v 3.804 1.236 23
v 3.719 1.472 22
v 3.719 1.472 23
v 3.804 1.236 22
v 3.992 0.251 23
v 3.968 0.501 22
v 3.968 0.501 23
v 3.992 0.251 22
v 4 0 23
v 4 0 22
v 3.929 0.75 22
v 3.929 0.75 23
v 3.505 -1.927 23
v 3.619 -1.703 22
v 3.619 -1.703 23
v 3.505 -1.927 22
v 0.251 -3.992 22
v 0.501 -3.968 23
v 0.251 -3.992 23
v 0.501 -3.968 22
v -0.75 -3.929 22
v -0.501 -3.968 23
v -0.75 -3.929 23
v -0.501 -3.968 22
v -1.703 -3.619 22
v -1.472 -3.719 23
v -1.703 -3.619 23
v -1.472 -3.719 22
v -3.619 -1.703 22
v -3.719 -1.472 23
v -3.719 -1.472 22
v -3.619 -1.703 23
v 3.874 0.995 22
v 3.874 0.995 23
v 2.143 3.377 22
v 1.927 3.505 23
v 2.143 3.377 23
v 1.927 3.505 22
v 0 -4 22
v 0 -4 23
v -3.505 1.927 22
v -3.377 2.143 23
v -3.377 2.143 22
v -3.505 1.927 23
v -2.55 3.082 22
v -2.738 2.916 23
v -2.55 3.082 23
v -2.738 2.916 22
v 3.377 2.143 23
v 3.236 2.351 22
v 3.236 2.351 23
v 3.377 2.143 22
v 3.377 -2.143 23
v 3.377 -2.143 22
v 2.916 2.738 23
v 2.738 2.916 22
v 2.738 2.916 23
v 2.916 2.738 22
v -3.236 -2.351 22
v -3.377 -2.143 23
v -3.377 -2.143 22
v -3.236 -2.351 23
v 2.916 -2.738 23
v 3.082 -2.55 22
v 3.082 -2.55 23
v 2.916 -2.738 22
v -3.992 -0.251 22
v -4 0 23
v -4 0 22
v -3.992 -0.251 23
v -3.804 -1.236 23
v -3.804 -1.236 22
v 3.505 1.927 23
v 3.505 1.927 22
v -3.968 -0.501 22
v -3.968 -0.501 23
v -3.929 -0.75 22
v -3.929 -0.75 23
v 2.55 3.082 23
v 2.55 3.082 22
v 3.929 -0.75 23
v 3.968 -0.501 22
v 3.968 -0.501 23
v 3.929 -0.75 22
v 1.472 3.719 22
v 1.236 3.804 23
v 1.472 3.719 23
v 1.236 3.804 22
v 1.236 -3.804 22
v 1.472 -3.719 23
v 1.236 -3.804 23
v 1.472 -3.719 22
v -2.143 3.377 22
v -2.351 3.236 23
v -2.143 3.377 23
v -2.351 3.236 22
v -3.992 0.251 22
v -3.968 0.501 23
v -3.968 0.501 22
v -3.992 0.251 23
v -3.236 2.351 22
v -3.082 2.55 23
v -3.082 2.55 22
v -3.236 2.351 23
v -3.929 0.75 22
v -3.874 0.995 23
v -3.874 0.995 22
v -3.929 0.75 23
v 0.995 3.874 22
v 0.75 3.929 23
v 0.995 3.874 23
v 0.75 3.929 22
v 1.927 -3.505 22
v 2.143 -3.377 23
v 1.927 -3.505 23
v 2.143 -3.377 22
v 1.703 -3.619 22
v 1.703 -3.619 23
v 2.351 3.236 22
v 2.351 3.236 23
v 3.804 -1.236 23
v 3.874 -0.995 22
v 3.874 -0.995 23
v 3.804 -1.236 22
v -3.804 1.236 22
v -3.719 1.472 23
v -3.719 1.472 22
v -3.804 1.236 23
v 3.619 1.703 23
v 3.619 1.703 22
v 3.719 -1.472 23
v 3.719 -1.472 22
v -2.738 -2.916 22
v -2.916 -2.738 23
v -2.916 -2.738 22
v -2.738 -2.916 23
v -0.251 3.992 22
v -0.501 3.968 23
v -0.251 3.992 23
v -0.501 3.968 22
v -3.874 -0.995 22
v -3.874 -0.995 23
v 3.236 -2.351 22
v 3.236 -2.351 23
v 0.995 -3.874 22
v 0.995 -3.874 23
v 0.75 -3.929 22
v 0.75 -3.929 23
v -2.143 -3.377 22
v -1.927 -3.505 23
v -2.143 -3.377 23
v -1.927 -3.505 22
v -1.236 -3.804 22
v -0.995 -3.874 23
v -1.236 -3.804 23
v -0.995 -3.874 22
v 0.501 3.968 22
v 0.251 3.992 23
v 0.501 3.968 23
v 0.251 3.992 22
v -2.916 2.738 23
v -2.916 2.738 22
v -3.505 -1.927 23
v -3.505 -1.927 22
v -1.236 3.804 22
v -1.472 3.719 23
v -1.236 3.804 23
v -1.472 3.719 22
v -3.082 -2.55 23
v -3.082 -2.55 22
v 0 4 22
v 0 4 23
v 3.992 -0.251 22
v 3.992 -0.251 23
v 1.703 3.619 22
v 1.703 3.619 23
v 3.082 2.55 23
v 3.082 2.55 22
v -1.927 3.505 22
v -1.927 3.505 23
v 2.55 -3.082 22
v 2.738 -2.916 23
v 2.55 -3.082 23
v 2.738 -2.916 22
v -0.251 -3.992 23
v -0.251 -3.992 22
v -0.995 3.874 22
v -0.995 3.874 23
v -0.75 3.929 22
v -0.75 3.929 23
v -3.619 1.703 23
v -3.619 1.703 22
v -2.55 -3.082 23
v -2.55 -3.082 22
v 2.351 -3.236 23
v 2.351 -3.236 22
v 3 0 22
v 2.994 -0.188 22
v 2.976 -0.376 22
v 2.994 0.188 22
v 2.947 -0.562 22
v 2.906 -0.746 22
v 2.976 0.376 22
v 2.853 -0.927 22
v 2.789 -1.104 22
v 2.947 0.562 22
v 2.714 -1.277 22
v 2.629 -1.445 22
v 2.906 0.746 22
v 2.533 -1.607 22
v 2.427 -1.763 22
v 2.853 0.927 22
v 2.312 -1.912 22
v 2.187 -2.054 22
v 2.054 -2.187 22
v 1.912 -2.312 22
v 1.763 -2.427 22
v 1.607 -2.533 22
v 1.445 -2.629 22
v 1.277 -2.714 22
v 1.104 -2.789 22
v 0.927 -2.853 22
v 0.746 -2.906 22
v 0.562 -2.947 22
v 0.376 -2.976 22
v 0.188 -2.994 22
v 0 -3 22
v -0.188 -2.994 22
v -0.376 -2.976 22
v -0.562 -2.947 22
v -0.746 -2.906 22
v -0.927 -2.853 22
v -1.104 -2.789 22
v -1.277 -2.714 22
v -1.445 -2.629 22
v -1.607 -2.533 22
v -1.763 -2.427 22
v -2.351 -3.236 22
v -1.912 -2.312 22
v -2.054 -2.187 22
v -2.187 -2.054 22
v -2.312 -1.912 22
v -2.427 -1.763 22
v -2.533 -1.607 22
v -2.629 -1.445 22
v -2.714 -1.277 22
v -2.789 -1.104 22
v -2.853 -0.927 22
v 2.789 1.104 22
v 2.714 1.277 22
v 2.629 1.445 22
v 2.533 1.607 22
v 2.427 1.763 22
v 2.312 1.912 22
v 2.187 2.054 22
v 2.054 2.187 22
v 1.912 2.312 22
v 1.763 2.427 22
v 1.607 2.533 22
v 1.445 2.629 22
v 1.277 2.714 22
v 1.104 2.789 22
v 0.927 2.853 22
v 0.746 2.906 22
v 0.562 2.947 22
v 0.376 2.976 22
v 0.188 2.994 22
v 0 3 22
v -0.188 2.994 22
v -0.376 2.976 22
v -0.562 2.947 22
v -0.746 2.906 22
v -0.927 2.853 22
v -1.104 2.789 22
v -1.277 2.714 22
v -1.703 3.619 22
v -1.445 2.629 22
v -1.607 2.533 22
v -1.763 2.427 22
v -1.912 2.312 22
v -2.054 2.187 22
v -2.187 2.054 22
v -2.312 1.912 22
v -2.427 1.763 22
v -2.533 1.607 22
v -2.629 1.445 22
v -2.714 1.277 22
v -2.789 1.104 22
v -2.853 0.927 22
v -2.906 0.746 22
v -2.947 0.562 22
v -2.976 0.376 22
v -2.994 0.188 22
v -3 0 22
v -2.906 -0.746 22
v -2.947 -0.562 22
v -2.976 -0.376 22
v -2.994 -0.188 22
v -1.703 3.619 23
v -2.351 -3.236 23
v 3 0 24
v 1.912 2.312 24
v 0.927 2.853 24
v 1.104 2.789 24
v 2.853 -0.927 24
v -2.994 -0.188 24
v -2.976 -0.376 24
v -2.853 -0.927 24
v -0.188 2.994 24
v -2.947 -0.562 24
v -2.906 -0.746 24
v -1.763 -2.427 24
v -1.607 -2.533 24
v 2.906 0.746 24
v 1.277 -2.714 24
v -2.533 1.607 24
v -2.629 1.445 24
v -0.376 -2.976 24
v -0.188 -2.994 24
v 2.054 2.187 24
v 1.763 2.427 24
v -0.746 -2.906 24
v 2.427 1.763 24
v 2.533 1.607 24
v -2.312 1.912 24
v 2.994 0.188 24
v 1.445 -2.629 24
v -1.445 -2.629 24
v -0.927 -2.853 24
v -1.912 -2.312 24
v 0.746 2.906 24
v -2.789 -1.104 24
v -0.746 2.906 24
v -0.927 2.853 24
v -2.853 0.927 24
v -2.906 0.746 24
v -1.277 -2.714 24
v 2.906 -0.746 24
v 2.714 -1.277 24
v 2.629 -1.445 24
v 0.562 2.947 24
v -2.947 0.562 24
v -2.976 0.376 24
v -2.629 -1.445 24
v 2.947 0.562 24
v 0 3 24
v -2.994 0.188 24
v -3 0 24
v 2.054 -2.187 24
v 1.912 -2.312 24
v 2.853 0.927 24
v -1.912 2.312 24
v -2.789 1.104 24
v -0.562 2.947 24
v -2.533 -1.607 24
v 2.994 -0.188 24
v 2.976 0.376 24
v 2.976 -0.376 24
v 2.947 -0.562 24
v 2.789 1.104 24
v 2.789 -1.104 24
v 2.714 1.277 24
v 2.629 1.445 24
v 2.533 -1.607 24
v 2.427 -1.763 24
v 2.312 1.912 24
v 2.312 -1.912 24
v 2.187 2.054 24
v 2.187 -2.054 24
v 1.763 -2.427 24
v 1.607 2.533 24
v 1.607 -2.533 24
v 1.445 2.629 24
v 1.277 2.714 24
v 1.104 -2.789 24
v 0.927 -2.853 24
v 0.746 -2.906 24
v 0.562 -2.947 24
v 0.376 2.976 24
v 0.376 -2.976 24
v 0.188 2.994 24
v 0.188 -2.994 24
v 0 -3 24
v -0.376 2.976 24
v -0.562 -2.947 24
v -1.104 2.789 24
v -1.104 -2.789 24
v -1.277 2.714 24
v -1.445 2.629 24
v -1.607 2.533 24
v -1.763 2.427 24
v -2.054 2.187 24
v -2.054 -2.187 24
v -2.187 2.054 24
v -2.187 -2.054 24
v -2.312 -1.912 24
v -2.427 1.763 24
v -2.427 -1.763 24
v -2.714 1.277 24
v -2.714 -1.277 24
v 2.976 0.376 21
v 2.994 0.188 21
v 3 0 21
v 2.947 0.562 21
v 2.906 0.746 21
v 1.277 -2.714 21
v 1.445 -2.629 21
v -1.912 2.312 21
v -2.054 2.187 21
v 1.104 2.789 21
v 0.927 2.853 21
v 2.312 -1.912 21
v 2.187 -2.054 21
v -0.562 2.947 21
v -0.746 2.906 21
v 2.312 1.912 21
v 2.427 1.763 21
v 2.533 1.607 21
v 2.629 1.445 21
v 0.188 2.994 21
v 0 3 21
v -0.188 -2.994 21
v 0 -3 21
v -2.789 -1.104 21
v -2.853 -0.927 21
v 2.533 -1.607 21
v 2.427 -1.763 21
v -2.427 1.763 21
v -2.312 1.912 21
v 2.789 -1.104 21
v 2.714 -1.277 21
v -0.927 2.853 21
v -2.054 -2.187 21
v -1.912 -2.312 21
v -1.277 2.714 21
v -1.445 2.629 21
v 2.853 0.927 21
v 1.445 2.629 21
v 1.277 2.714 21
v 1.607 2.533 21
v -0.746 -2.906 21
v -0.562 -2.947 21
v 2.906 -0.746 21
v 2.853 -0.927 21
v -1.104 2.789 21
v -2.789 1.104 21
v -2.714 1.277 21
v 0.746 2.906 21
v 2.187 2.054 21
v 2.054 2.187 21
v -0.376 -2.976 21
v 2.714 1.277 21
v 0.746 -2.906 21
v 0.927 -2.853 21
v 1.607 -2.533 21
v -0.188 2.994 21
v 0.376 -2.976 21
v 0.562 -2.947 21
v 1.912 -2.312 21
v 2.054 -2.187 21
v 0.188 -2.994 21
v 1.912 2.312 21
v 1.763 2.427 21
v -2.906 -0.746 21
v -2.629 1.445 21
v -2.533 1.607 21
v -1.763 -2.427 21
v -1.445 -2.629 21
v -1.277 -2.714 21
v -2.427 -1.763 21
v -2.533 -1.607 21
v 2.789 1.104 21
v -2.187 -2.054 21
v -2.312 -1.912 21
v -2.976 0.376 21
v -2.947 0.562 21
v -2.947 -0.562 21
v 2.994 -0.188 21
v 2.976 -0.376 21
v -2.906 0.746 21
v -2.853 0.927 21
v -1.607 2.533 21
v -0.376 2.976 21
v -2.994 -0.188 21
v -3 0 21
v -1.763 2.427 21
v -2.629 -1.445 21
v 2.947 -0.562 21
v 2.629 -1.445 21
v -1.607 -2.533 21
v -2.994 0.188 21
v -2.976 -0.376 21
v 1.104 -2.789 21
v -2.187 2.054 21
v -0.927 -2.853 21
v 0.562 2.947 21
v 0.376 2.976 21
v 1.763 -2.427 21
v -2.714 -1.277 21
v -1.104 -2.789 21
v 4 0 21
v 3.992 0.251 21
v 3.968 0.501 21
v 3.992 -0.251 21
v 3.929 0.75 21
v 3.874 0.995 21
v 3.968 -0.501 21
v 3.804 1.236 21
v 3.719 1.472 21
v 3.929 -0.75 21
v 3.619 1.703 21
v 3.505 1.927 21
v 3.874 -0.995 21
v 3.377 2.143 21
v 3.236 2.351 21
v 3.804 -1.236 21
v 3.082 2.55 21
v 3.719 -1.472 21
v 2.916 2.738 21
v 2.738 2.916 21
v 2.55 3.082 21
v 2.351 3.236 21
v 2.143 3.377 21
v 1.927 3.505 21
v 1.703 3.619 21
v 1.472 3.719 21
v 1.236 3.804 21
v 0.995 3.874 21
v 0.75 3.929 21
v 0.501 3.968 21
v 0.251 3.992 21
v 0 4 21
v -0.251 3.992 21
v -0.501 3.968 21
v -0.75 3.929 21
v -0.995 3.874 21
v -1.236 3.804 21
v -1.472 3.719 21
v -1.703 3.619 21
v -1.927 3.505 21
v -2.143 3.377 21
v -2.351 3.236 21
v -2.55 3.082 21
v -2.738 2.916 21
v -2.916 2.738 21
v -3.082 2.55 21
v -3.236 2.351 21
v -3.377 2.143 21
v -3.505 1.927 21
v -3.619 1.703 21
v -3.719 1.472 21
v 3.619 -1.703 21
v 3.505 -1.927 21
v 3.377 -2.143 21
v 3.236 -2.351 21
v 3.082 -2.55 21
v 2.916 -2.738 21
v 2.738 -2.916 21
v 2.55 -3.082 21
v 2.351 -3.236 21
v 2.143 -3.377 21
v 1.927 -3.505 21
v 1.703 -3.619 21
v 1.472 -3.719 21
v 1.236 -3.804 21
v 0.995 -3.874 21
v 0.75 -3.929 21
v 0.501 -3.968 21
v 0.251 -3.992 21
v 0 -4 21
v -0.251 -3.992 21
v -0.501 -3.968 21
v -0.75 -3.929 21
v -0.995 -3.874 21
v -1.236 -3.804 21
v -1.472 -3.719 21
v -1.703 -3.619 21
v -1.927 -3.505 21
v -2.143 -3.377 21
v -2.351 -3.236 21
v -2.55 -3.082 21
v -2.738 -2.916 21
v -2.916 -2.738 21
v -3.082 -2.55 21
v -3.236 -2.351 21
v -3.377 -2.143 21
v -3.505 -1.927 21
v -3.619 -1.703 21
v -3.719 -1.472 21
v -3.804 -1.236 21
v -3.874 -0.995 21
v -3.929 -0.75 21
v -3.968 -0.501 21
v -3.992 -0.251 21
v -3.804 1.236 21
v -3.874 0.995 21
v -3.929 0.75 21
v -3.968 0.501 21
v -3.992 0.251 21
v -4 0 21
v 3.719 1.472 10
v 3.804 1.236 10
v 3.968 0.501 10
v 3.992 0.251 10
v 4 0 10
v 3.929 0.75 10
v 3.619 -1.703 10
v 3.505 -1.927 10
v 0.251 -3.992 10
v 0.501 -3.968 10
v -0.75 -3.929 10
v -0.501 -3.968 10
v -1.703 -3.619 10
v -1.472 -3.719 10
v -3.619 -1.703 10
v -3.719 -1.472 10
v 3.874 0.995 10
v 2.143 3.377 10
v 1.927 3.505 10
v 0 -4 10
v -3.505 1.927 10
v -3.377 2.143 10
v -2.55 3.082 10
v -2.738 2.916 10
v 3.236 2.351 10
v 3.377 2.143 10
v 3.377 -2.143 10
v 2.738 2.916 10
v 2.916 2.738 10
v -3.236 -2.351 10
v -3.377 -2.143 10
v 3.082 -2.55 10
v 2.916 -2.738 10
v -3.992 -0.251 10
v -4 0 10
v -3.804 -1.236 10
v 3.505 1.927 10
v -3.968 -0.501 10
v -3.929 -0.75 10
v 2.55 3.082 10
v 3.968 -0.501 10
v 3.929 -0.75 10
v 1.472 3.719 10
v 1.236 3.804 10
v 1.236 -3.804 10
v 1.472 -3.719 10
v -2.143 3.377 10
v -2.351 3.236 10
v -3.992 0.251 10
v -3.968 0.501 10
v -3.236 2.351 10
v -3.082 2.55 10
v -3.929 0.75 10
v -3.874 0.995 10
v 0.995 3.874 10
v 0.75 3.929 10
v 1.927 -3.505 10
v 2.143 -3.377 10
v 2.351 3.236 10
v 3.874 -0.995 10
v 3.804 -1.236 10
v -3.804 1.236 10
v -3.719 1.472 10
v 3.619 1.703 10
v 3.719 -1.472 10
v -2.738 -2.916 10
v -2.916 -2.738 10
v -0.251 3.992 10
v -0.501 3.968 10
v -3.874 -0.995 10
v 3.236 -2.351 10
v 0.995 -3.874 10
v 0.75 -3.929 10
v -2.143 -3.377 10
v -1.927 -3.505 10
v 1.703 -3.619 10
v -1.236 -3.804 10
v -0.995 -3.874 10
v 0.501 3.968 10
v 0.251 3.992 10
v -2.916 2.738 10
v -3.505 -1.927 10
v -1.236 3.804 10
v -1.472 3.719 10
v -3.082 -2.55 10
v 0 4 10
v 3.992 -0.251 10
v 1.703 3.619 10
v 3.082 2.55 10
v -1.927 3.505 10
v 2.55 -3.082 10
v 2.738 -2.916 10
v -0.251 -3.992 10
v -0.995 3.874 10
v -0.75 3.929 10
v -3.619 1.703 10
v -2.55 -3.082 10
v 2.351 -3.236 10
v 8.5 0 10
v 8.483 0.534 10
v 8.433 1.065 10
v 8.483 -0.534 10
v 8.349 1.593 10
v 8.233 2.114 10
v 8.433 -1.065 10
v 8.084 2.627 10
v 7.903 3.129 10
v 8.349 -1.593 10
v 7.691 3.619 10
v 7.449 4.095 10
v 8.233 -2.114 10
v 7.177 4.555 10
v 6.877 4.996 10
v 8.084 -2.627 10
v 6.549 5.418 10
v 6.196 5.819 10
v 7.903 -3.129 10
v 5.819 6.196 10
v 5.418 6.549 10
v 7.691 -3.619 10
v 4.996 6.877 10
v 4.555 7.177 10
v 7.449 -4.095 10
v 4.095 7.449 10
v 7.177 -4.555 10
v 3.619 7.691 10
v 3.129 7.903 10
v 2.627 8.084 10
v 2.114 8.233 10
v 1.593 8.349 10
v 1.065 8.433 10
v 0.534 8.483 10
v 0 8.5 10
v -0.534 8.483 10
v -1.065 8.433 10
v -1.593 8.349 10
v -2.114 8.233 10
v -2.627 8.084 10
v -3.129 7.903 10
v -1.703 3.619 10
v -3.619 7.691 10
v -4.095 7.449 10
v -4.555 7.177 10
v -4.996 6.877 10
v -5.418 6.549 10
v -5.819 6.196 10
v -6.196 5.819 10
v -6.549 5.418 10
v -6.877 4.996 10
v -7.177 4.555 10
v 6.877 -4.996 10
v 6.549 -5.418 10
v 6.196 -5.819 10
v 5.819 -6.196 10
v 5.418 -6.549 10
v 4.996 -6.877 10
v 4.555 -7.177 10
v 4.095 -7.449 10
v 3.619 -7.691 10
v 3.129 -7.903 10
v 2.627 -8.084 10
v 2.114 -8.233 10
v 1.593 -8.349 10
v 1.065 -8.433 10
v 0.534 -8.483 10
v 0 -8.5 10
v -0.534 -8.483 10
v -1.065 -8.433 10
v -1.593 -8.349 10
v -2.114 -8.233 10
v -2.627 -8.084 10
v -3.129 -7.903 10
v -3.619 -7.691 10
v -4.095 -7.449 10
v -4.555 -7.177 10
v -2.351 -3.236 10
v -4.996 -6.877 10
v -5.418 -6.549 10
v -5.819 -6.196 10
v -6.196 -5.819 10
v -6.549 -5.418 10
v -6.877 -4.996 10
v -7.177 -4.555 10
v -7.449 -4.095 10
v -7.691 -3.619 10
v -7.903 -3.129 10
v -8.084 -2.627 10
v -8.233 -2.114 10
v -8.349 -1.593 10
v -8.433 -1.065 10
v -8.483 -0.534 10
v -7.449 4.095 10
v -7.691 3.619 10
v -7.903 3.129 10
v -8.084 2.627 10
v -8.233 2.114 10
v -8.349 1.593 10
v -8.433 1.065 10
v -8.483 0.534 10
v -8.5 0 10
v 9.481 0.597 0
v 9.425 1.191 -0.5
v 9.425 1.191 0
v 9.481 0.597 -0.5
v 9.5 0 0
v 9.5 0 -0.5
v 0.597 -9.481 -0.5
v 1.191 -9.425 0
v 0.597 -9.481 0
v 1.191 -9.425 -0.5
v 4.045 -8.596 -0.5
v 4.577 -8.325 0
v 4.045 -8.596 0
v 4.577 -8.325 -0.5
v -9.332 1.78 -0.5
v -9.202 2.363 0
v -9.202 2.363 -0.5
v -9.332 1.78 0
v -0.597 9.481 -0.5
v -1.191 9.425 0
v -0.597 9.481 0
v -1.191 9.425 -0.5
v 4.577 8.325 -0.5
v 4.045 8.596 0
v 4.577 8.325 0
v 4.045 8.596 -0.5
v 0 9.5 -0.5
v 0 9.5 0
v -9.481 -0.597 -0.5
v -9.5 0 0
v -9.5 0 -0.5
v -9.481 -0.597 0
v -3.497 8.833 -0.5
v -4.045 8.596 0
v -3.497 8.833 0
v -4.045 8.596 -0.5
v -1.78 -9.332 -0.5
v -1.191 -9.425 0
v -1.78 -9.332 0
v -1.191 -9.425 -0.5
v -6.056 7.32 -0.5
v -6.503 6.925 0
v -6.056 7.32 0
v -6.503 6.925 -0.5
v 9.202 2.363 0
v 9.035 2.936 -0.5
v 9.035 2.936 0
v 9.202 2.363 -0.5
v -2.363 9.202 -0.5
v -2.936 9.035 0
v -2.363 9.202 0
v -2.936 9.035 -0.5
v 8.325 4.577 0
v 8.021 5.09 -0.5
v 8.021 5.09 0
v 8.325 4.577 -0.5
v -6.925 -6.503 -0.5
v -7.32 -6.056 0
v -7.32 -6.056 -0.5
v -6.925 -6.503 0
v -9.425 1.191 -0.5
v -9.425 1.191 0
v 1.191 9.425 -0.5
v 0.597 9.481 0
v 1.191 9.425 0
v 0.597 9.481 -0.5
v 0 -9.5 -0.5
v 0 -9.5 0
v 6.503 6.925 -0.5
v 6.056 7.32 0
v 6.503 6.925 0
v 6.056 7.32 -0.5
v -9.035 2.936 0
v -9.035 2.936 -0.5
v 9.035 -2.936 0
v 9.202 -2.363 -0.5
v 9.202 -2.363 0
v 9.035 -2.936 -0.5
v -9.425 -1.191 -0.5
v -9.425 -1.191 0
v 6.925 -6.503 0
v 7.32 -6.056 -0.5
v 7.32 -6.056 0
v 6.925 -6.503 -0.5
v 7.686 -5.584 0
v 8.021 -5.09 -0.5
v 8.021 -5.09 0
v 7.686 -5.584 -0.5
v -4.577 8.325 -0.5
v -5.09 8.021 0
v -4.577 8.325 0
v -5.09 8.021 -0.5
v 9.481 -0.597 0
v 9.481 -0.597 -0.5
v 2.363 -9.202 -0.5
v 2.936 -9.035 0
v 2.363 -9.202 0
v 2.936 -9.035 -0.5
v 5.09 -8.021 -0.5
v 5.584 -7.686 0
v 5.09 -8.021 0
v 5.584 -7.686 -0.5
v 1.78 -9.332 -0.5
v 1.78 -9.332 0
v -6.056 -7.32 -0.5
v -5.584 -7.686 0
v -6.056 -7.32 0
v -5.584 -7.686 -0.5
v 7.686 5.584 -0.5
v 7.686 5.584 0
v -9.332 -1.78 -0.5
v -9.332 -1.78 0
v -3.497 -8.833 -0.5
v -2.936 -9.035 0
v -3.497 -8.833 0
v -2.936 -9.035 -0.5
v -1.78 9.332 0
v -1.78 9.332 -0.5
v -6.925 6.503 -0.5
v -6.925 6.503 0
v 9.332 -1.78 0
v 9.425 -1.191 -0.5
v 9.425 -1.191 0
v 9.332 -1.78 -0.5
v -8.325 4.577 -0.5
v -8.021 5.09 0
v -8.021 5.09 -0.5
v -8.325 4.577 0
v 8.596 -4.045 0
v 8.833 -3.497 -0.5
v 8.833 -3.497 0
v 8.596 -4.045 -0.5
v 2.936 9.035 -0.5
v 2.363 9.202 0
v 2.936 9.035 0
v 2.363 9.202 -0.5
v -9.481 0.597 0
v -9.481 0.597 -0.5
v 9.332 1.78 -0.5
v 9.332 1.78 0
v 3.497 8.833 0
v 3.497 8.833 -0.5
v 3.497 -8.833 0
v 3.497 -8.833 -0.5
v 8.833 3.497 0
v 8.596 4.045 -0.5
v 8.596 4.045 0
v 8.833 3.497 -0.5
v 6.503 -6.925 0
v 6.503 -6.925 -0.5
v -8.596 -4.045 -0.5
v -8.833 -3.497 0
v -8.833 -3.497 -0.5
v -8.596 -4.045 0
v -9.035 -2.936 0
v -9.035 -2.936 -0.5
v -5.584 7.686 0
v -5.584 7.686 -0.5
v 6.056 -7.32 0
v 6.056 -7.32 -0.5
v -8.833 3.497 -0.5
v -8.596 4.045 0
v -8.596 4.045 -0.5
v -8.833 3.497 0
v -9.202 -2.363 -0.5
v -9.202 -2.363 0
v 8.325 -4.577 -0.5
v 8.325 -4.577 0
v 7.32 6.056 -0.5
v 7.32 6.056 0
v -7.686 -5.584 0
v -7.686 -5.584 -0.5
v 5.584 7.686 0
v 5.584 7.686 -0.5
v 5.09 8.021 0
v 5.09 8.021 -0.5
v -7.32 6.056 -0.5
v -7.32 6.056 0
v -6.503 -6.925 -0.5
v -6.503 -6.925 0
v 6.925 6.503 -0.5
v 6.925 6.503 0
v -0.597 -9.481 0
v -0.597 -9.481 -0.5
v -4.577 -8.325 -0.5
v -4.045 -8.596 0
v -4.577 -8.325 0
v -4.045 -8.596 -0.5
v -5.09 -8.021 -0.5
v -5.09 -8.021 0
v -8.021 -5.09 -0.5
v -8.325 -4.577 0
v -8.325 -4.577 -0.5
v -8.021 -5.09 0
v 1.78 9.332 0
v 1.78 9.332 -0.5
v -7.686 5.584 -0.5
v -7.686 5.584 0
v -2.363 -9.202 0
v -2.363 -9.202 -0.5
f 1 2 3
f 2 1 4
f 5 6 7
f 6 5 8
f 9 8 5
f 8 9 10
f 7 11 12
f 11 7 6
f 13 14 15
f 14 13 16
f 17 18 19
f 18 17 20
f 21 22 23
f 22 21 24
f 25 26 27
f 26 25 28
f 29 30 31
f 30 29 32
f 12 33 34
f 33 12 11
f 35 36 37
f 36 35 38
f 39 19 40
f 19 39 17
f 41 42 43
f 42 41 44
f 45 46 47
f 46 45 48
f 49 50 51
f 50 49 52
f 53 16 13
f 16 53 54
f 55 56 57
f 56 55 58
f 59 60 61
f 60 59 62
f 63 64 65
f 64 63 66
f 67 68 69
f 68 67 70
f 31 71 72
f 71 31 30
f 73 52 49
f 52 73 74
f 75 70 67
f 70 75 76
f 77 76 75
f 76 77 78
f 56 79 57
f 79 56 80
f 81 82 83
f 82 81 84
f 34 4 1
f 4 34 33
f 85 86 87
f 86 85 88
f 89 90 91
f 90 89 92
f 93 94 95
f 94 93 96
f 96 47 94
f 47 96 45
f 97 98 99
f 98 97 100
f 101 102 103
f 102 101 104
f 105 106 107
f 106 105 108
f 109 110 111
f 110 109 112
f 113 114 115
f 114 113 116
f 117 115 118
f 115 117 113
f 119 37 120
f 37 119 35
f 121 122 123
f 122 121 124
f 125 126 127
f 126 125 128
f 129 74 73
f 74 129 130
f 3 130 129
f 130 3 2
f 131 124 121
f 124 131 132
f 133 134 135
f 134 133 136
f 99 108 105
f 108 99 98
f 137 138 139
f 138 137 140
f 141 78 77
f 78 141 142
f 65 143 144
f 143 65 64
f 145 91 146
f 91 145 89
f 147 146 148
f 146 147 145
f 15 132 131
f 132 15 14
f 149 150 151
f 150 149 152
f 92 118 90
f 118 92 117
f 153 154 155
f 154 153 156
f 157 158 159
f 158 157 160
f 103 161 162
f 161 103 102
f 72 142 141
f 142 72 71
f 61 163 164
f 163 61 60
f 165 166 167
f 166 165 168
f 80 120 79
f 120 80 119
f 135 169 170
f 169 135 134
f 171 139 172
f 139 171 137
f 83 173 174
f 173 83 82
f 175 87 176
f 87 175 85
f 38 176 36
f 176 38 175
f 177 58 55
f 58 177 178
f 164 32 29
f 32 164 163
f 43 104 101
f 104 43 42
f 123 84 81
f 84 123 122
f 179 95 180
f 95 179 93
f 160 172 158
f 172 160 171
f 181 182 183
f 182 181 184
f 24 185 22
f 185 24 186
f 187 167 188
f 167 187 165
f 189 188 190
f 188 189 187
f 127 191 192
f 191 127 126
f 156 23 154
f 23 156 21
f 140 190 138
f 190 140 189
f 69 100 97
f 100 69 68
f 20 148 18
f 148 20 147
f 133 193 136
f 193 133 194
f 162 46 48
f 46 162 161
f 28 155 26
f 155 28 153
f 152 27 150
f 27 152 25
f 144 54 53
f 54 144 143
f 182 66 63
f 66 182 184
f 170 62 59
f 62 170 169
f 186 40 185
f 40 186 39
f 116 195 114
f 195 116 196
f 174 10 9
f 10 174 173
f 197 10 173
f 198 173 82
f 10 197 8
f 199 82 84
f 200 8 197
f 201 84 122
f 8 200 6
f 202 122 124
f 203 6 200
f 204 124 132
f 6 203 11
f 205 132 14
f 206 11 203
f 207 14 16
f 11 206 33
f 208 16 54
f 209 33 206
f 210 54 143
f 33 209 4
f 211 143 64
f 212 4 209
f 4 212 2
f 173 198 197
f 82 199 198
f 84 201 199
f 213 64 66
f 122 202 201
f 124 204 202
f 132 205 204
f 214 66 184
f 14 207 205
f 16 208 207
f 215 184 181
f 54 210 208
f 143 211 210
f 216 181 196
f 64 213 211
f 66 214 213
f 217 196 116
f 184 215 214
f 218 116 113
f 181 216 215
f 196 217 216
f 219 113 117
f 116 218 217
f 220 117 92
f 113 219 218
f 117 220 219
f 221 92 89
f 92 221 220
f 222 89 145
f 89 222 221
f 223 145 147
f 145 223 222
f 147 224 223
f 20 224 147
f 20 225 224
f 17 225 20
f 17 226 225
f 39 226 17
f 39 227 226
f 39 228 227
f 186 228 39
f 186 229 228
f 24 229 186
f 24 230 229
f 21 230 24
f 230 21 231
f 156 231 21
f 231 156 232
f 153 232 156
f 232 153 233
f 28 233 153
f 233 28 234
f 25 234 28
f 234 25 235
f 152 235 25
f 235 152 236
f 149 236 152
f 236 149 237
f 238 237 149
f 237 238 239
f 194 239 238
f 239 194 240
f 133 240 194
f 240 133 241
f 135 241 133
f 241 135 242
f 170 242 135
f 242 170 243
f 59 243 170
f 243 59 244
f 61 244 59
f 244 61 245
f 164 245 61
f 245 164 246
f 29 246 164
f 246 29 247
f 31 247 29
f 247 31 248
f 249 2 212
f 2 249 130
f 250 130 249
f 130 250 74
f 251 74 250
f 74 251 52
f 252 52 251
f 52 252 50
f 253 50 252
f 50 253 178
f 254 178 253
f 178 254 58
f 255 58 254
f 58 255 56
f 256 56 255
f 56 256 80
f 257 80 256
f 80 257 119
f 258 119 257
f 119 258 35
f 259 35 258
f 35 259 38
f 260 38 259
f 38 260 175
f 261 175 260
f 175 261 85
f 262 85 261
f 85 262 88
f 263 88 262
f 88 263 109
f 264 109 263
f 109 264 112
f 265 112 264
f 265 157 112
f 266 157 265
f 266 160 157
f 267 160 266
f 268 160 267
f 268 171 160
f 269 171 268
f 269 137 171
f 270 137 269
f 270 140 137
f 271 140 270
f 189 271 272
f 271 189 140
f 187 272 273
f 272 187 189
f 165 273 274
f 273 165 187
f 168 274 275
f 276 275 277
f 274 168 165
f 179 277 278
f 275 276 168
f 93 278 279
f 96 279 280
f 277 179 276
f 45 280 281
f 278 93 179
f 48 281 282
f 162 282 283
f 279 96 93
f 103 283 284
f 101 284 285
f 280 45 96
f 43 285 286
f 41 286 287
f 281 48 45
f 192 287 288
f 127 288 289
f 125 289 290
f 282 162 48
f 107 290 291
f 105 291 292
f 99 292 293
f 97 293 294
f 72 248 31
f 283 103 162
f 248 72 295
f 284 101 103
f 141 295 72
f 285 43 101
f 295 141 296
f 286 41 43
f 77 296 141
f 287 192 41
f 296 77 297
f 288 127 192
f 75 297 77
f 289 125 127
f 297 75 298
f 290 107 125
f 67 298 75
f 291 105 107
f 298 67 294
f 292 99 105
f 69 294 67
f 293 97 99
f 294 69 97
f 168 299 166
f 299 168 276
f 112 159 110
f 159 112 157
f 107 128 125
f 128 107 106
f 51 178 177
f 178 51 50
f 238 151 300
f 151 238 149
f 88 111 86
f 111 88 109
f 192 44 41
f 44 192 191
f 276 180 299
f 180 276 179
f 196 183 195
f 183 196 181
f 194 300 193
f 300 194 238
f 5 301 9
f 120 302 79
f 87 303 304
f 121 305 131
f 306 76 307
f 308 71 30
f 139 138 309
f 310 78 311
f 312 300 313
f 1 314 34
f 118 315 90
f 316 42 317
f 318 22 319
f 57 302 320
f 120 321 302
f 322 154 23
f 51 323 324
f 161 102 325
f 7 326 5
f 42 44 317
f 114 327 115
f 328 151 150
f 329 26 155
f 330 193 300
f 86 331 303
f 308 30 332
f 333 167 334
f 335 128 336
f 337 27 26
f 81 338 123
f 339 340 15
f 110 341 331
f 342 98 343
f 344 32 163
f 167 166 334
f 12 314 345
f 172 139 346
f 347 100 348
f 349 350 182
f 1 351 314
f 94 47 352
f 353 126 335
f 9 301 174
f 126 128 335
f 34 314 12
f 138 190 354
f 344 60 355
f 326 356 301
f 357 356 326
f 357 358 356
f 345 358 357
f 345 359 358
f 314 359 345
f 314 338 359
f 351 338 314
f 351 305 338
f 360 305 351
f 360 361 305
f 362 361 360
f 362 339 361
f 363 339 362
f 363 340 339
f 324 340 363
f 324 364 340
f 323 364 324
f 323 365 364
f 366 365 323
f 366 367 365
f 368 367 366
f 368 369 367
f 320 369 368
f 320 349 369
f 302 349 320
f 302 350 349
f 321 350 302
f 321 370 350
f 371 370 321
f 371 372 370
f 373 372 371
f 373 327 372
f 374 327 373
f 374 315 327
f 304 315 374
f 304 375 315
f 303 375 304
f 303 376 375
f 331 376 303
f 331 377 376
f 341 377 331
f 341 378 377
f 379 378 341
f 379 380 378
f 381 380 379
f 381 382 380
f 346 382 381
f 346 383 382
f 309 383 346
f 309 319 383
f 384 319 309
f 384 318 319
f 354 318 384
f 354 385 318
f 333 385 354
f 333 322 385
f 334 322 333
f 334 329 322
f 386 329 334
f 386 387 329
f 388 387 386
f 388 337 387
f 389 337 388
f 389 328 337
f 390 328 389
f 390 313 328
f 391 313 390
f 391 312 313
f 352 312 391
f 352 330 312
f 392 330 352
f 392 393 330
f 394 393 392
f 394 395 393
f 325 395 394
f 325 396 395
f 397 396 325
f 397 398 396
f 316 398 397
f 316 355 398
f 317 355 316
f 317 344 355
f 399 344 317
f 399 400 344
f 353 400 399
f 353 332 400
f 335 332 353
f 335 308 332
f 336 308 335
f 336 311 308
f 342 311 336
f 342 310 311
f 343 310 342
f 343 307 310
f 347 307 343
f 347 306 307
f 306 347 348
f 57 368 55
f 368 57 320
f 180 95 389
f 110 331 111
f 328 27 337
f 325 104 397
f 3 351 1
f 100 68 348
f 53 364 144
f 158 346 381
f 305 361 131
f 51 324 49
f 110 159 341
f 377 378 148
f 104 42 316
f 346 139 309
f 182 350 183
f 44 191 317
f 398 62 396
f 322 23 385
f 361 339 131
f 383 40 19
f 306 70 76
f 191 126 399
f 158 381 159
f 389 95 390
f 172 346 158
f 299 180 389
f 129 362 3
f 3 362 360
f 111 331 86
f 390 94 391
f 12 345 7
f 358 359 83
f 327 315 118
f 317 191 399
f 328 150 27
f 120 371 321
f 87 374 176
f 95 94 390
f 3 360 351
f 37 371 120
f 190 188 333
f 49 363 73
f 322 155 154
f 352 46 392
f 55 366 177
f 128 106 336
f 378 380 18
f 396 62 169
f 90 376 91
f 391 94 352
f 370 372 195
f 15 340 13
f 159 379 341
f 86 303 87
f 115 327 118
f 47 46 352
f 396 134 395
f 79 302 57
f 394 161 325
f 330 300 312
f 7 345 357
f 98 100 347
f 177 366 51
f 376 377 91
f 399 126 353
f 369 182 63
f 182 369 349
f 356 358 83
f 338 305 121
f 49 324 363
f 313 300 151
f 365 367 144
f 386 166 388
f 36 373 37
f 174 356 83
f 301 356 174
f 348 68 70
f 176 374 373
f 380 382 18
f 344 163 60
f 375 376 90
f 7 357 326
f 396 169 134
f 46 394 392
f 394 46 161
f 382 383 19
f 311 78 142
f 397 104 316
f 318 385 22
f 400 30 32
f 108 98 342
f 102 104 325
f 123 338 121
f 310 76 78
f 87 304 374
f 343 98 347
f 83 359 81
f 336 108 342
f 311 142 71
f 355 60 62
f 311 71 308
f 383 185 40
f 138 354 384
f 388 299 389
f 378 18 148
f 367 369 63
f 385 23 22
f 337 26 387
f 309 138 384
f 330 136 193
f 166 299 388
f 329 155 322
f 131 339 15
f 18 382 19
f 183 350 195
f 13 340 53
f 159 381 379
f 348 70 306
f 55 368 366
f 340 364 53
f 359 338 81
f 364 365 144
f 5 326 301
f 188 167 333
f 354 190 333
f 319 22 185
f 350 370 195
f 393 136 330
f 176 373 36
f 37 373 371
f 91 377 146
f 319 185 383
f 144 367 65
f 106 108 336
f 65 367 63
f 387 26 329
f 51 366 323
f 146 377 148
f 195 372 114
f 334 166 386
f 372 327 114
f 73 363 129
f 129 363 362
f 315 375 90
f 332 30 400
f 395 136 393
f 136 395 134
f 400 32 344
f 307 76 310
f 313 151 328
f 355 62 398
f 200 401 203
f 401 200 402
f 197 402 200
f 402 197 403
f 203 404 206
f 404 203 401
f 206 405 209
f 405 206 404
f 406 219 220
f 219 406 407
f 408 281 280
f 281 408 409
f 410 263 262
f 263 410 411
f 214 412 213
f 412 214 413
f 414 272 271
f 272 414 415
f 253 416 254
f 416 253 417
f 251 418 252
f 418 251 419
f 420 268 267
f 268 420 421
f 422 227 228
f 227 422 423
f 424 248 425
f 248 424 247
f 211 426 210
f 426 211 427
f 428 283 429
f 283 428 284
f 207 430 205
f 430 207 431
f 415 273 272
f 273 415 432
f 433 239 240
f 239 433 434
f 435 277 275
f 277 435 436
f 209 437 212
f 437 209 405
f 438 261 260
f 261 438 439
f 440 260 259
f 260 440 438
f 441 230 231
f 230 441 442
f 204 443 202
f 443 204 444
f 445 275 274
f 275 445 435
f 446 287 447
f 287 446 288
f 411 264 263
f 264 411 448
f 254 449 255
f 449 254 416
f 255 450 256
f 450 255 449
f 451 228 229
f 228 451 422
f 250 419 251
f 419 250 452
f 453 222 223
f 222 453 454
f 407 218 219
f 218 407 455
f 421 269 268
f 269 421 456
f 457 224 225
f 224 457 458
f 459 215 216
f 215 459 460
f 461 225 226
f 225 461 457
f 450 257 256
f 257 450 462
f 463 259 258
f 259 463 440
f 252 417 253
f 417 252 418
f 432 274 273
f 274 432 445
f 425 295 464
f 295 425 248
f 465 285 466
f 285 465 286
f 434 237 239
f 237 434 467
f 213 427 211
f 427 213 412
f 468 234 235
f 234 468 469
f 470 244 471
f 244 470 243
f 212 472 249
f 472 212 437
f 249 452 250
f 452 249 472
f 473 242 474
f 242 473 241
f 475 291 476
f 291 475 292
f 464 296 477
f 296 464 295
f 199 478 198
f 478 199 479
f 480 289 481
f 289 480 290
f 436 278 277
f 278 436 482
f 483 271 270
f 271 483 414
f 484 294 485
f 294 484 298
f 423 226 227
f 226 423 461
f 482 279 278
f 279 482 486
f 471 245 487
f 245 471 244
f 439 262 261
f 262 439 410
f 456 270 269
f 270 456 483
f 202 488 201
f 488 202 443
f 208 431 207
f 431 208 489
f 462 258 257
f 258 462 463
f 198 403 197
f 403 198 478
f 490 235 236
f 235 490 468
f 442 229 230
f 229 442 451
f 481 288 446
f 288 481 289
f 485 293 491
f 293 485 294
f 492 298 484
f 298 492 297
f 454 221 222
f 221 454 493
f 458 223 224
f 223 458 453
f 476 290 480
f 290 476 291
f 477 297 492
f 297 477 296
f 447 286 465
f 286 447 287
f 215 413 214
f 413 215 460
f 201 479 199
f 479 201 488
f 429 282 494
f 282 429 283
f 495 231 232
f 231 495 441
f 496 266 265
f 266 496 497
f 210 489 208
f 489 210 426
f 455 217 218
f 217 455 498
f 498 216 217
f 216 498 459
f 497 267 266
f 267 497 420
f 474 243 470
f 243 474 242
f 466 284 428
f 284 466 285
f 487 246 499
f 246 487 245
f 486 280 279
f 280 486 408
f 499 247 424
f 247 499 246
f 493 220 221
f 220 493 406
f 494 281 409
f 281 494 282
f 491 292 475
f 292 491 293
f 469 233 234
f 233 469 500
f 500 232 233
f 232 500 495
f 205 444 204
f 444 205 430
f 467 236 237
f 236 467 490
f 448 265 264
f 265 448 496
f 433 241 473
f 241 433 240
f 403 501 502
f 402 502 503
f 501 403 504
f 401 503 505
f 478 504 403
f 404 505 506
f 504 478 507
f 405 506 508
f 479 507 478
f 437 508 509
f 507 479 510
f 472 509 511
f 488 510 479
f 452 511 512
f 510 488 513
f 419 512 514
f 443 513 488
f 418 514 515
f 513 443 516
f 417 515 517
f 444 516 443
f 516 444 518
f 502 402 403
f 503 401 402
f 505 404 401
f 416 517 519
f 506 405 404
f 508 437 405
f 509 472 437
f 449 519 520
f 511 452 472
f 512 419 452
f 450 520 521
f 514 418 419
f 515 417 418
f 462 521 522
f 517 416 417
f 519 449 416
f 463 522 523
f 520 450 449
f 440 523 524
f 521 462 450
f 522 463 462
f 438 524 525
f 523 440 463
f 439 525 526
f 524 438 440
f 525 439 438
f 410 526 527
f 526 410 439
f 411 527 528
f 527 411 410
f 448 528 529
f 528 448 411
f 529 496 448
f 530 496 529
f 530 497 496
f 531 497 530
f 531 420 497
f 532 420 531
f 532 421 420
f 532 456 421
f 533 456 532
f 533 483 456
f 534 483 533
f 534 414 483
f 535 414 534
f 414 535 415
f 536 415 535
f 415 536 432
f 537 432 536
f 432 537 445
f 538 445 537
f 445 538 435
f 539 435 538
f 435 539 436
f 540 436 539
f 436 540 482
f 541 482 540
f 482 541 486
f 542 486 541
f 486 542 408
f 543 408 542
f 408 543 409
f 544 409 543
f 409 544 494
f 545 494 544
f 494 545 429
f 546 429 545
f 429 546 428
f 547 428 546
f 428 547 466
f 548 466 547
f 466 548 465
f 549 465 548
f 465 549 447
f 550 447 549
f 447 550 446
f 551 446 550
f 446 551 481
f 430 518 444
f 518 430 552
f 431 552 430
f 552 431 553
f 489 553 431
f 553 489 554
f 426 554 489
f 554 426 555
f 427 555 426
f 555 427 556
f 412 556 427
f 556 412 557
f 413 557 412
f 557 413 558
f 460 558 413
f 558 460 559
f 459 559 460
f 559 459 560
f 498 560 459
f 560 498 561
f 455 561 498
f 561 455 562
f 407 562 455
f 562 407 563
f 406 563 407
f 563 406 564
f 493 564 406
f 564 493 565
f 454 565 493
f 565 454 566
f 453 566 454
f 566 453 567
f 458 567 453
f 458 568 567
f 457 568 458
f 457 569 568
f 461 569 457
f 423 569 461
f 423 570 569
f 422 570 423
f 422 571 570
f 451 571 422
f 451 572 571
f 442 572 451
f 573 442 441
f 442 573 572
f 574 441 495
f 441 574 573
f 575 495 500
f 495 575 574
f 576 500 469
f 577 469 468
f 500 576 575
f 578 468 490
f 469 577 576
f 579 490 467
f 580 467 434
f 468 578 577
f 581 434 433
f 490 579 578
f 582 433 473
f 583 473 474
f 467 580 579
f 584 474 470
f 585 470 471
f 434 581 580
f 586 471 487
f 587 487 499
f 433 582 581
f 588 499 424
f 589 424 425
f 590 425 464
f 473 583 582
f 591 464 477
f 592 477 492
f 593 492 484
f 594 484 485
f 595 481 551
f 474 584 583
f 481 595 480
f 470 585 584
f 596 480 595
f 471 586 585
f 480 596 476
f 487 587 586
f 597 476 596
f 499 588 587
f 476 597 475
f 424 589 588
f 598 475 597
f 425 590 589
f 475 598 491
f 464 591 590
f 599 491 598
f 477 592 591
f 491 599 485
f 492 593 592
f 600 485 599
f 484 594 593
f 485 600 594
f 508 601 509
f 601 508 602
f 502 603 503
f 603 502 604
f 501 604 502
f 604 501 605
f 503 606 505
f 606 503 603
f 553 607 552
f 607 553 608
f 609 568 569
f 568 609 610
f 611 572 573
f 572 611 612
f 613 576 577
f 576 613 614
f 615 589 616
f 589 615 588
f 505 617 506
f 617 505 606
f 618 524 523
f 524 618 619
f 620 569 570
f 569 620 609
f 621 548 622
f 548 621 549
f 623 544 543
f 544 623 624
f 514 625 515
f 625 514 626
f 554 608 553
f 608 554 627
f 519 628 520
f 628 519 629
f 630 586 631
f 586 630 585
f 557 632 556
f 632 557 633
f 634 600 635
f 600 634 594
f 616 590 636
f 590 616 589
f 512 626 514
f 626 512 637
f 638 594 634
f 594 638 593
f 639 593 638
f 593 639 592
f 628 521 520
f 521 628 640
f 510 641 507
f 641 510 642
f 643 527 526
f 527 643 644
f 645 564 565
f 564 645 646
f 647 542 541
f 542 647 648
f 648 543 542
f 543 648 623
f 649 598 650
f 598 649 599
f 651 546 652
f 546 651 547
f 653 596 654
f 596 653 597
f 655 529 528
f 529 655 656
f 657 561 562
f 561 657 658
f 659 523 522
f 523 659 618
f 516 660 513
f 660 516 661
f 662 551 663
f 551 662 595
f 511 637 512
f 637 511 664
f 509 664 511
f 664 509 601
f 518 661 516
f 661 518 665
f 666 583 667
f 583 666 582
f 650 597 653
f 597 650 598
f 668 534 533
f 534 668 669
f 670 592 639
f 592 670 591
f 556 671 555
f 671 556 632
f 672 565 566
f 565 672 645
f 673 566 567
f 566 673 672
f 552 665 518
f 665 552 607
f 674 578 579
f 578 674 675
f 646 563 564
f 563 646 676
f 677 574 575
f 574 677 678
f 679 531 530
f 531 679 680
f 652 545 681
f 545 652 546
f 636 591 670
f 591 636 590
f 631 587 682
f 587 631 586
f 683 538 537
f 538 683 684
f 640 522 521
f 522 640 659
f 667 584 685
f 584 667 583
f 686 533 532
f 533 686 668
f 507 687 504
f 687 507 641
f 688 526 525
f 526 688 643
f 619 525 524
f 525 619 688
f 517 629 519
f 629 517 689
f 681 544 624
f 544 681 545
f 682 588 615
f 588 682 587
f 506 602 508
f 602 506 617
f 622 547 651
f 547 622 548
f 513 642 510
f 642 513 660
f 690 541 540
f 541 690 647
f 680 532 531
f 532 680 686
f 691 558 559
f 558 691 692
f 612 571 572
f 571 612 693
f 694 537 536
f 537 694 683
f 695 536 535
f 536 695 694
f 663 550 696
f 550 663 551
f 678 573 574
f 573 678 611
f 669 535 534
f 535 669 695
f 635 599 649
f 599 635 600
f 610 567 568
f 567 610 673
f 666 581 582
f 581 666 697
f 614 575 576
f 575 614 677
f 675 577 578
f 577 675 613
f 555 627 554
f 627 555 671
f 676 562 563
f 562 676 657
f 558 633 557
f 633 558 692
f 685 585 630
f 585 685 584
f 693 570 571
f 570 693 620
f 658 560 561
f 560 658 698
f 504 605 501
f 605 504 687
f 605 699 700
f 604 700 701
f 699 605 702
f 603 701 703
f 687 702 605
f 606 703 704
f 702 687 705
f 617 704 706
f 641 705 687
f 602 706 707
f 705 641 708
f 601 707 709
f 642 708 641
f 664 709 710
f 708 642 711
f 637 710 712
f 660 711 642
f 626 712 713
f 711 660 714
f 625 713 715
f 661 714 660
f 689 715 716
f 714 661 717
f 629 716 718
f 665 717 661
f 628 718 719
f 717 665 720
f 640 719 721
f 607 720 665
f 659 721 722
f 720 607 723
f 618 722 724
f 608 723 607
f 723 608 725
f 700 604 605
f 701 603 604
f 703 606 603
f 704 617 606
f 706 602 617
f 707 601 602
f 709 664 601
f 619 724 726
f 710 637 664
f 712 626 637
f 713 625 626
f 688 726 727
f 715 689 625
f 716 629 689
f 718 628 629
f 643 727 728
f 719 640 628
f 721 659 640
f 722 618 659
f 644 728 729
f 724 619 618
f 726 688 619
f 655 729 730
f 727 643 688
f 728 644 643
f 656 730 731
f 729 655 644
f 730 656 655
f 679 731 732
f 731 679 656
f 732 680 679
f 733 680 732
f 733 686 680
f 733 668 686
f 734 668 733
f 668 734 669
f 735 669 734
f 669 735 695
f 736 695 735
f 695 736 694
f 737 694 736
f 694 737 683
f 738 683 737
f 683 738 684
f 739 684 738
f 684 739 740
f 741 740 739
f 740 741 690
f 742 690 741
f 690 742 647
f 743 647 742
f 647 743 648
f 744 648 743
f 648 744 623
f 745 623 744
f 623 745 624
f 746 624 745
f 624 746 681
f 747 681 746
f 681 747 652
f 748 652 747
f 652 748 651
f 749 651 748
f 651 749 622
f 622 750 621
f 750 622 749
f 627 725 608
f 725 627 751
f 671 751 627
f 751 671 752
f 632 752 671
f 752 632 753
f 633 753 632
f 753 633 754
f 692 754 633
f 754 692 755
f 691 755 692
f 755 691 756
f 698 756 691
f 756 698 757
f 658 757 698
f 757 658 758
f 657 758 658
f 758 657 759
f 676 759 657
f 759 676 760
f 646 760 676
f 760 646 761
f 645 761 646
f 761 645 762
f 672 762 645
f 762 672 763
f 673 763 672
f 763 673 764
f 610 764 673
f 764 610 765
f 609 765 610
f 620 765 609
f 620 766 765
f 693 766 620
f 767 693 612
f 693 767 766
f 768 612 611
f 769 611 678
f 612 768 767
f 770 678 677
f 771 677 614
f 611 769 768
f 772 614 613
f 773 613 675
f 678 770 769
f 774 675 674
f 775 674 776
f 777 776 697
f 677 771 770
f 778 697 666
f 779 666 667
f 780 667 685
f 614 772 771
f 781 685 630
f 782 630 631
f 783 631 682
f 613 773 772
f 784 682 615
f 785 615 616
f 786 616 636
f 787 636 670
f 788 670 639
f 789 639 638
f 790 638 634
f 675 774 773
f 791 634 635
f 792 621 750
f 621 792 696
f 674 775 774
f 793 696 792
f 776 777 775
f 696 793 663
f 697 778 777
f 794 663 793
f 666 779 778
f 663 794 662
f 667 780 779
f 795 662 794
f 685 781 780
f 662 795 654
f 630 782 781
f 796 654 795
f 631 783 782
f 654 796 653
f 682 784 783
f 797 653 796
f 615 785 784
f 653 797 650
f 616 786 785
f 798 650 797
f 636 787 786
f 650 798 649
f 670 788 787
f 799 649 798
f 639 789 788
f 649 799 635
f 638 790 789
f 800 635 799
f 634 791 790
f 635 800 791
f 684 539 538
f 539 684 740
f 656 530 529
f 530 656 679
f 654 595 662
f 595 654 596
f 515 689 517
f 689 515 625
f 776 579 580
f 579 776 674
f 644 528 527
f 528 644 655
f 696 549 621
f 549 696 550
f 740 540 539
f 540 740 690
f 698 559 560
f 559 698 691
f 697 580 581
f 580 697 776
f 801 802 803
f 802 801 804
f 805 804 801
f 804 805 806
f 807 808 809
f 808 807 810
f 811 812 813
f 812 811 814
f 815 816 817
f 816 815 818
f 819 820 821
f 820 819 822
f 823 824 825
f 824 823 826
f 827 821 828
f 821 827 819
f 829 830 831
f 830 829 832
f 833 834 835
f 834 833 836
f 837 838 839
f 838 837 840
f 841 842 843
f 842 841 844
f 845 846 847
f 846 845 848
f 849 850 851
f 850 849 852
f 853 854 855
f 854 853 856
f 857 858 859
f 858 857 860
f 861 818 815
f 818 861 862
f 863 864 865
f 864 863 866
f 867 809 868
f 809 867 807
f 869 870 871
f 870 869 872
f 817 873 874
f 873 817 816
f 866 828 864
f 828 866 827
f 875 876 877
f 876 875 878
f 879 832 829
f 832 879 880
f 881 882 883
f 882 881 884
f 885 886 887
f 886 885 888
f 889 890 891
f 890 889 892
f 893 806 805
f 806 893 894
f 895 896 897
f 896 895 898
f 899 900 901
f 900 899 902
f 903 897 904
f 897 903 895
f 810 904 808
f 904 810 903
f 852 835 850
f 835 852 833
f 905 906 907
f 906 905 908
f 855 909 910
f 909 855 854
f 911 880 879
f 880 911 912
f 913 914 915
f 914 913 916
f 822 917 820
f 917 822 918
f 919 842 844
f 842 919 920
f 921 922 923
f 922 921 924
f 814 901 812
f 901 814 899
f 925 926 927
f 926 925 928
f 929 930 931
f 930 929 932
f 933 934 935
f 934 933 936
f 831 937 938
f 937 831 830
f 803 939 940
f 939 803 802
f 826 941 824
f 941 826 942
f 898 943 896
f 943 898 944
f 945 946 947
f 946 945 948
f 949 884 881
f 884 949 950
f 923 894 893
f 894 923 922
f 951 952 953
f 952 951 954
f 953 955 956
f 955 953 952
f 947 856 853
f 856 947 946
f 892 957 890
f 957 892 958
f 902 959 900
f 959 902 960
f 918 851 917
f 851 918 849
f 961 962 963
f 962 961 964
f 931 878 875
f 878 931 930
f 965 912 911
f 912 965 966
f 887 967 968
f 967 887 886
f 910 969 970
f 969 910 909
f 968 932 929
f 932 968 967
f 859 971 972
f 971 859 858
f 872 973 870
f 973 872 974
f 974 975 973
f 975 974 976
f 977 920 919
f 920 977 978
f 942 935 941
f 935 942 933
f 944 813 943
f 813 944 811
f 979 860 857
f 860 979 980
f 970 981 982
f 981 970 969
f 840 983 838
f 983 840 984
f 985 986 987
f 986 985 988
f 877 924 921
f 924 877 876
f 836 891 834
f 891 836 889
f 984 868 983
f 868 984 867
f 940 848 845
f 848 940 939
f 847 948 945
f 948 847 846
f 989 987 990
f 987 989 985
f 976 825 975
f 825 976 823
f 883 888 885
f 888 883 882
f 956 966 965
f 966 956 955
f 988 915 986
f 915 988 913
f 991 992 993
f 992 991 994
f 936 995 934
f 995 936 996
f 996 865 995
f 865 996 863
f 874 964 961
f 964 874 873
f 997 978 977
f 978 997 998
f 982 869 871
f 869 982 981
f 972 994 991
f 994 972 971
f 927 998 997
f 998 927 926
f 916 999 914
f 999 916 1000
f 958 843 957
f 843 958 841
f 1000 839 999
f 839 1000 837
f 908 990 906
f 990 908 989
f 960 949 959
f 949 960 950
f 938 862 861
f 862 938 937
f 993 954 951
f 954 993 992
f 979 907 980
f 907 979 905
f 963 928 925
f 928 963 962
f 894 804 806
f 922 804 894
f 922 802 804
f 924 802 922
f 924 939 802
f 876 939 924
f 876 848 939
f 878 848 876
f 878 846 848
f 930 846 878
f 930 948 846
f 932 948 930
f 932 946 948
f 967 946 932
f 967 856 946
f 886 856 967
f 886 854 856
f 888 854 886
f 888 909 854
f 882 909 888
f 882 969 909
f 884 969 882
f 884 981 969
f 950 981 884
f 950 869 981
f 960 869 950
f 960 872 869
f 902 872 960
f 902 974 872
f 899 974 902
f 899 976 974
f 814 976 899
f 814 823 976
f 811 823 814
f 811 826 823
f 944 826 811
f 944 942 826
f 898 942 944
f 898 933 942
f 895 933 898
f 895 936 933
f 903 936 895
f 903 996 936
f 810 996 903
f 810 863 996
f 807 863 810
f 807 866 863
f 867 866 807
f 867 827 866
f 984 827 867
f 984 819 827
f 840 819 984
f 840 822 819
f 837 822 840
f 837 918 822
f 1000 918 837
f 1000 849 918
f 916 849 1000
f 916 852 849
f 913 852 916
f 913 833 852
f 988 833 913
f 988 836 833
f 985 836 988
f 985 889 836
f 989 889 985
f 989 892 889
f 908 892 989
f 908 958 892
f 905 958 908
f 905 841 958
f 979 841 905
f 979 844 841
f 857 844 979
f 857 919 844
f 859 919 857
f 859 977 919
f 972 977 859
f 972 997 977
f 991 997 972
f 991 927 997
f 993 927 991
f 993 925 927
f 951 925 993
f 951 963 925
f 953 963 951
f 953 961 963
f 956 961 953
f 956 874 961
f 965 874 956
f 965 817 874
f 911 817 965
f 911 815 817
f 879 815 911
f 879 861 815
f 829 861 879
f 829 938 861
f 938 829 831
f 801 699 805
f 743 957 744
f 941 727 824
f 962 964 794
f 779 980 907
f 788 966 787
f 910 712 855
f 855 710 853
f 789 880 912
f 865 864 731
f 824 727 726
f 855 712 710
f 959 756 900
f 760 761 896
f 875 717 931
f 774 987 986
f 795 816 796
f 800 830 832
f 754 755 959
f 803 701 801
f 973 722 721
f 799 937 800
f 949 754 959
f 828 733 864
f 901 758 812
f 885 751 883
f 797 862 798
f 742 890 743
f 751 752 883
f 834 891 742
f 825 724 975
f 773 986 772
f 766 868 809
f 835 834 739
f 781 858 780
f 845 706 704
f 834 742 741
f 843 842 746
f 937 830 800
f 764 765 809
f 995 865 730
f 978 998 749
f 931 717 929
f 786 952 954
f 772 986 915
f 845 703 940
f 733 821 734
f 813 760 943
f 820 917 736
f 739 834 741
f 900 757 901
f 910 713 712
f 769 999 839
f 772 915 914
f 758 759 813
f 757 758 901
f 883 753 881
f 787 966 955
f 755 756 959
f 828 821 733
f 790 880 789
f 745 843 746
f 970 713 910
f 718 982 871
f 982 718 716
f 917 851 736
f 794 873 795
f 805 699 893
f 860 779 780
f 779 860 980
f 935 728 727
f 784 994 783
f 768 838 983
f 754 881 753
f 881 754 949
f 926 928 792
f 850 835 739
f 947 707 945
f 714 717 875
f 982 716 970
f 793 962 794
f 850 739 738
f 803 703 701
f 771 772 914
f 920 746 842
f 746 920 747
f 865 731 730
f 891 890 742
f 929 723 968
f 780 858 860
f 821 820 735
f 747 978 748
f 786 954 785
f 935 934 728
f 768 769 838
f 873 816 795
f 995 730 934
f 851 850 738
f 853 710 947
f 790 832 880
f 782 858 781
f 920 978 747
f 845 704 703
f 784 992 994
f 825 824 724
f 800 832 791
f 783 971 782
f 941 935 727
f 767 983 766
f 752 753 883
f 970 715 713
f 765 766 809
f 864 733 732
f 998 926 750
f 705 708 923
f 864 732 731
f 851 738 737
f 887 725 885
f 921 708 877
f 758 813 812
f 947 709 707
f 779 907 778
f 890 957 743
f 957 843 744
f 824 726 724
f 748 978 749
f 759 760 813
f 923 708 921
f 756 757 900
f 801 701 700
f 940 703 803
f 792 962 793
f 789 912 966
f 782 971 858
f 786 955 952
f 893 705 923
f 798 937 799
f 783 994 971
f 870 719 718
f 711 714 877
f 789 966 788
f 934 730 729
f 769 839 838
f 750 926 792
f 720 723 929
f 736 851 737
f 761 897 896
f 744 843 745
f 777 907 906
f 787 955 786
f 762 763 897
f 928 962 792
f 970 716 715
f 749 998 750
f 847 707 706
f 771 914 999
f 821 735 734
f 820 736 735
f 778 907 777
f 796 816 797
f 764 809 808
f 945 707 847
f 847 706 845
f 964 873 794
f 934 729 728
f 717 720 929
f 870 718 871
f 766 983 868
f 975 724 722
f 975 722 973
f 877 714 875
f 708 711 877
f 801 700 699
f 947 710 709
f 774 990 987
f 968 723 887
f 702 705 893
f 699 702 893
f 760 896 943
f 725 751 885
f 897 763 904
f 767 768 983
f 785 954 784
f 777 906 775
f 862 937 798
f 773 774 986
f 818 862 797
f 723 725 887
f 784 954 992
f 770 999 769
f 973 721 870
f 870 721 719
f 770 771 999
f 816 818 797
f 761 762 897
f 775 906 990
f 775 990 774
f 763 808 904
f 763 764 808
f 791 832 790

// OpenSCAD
// file: params.scad
//  ----------------------------------------------------------------------- LICENSE
//  This "brumm-case" by Andreas Streichardt is licensed
//  under the Creative Commons Attribution-ShareAlike 3.0 Unported License.
//  To view a copy of this license, visit
//  http://creativecommons.org/licenses/by-sa/3.0/
//  or send a letter to Creative Commons, PO Box 1866, Mountain View, CA 94042, USA.
//
//  Originally (and still heavily) based on work by Zygmunt Wojcik
//  https://github.com/zygmuntw/3D-Printed-Case-for-Arduino
//
//------------------------------------------------------------------------- SHARED PARAMETERS
$fn=100; // resolution

circleD = 21; // round corner circle diameter
roundR = circleD/2; // round corner circle radius
triangleH = (sqrt(3)*(circleD))/2; // triangle height to calculate other variables

layerHeight = 0.25; // some variariables are multiple of layer height and width
layerWidth = 0.5;

screwExt = 3.4; // screw through hole diameter
verConnectionHoleR = 1.2; // screw thread hole radius
screwHead = 6; // screw head hole diameter

gap = layerHeight/2;

floorHeight = 1.8; // 6*0.25 layer + 0.3 first layer

height = 30; // case height
innerHeight = height - floorHeight*2;

pillarSize = roundR-0.01; // corner pillar size

// dimensions of minkowski's inner square
// these are NOT case dimensions
// to calculate external case dimesions add 2 * roundR
// 55.3 + (2*10.5) = 76.3
width = 160.0;
wide = 80;

blockLockSize = 2; // middle connection lock size

// side cutting panels size
sidePanelXWidth = wide;
sidePanelYWidth = width;

// screw hole position from centre of the corner round circle
screwHoleRoundR = roundR - layerWidth*4 - (triangleH/2 - layerWidth*4)/2;

// prints dimensions of the case
echo("width", width + roundR*2); // total width
echo("wide", wide + roundR*2); // total wide

pcbHeight=1.64;
pcbHeightOffset = 2.5;
pcbGap = 4;

canPcbLength=28.0;
canPcbWidth=43.0;
canPcbPositionX = (width/2 + roundR - layerWidth*7 - gap*4) - pcbGap - canPcbLength;
canPcbPositionY = -3/4*canPcbWidth;
canPcbHoles=[ [2.5, 2.5, 0], 				
              [2.5, canPcbWidth - 2.5, 0],
          		[canPcbLength - 2.5, 2.5, 0],
          		[canPcbLength - 2.5, canPcbWidth - 2.5, 0] ];

// UNO PCB dimensions
megaPcbLength=102.0;
megaPcbWidth=53.3;
megaPcbPositionX = canPcbPositionX - megaPcbLength - pcbGap;
megaPcbPositionY = -(wide/2 + roundR - layerWidth*7 - gap*4) + 2;

megaPcbHoles=[  [13.97, 2.54, 0], 				
                [15.24, 50.8, 0],
          		[66.04, 35.56, 0],
          		[66.04, 7.62, 0],
                [96.5, 2.54, 0],
                [90.0, 50.8, 0]
             ];



usbPcbLength=63.0;
usbPcbWidth=30.0;
usbHeight = 21.0; // including some offset for the usb cable
usbPcbPositionX = -usbPcbLength/2;
usbPcbPositionY = megaPcbPositionY + megaPcbWidth + pcbGap;
usbPcbHoles=[  [14.0, usbPcbWidth - 3.8, 0], 				
                [56.1, usbPcbWidth - 2.8, 0],
          		[28.5, 4.8, 0]
             ];
             
convPcbLength=30;
convPcbWidth=50.5;
convHeight=23.0;
convPcbPositionX=megaPcbPositionX - pcbGap - convPcbLength;
convPcbPositionY=megaPcbPositionY + megaPcbWidth - 17;
convPcbHoles=[  [4.5, 4.5, 0], 				
                [4.5, 40.0, 0],
          		[24.7, 4.5, 0],
                [24.7, 40.0, 0]
             ];
             
nubsiPositions =[
                    [width/2+roundR-35,-wide/2-roundR+30,0],
                    [width/2+roundR-35-72,-wide/2-roundR+30-8,0],
                    [width/2+roundR-35-72,-wide/2-roundR+30-8+44,0]
                ];
// main file
//  ----------------------------------------------------------------------- LICENSE
//  This "brumm-case" by Andreas Streichardt is licensed
//  under the Creative Commons Attribution-ShareAlike 3.0 Unported License.
//  To view a copy of this license, visit
//  http://creativecommons.org/licenses/by-sa/3.0/
//  or send a letter to Creative Commons, PO Box 1866, Mountain View, CA 94042, USA.
//
//  Originally (and still heavily) based on work by Zygmunt Wojcik
//  https://github.com/zygmuntw/3D-Printed-Case-for-Arduino
//

include <params.scad>

module nubsi() {
    union() {
        translate([0,0,-0.5])
        cylinder(h = 0.5, r=19/2);
		cylinder(h = 10, r1=19/2, r2 = 17/2);
        translate([0,0,10])
        {
            cylinder(h = 11, r=8/2);
            translate([0,0,11])
            {
                cylinder(h = 1, r=3);
                translate([0,0,1])
                {
                    cylinder(h = 1, r=4);
                    translate([0,0,1])
                    {
                        cylinder(h = 1, r1=4, r2=3);
                    }
                }
                
            }
        }
        
	}

}

nubsi();
